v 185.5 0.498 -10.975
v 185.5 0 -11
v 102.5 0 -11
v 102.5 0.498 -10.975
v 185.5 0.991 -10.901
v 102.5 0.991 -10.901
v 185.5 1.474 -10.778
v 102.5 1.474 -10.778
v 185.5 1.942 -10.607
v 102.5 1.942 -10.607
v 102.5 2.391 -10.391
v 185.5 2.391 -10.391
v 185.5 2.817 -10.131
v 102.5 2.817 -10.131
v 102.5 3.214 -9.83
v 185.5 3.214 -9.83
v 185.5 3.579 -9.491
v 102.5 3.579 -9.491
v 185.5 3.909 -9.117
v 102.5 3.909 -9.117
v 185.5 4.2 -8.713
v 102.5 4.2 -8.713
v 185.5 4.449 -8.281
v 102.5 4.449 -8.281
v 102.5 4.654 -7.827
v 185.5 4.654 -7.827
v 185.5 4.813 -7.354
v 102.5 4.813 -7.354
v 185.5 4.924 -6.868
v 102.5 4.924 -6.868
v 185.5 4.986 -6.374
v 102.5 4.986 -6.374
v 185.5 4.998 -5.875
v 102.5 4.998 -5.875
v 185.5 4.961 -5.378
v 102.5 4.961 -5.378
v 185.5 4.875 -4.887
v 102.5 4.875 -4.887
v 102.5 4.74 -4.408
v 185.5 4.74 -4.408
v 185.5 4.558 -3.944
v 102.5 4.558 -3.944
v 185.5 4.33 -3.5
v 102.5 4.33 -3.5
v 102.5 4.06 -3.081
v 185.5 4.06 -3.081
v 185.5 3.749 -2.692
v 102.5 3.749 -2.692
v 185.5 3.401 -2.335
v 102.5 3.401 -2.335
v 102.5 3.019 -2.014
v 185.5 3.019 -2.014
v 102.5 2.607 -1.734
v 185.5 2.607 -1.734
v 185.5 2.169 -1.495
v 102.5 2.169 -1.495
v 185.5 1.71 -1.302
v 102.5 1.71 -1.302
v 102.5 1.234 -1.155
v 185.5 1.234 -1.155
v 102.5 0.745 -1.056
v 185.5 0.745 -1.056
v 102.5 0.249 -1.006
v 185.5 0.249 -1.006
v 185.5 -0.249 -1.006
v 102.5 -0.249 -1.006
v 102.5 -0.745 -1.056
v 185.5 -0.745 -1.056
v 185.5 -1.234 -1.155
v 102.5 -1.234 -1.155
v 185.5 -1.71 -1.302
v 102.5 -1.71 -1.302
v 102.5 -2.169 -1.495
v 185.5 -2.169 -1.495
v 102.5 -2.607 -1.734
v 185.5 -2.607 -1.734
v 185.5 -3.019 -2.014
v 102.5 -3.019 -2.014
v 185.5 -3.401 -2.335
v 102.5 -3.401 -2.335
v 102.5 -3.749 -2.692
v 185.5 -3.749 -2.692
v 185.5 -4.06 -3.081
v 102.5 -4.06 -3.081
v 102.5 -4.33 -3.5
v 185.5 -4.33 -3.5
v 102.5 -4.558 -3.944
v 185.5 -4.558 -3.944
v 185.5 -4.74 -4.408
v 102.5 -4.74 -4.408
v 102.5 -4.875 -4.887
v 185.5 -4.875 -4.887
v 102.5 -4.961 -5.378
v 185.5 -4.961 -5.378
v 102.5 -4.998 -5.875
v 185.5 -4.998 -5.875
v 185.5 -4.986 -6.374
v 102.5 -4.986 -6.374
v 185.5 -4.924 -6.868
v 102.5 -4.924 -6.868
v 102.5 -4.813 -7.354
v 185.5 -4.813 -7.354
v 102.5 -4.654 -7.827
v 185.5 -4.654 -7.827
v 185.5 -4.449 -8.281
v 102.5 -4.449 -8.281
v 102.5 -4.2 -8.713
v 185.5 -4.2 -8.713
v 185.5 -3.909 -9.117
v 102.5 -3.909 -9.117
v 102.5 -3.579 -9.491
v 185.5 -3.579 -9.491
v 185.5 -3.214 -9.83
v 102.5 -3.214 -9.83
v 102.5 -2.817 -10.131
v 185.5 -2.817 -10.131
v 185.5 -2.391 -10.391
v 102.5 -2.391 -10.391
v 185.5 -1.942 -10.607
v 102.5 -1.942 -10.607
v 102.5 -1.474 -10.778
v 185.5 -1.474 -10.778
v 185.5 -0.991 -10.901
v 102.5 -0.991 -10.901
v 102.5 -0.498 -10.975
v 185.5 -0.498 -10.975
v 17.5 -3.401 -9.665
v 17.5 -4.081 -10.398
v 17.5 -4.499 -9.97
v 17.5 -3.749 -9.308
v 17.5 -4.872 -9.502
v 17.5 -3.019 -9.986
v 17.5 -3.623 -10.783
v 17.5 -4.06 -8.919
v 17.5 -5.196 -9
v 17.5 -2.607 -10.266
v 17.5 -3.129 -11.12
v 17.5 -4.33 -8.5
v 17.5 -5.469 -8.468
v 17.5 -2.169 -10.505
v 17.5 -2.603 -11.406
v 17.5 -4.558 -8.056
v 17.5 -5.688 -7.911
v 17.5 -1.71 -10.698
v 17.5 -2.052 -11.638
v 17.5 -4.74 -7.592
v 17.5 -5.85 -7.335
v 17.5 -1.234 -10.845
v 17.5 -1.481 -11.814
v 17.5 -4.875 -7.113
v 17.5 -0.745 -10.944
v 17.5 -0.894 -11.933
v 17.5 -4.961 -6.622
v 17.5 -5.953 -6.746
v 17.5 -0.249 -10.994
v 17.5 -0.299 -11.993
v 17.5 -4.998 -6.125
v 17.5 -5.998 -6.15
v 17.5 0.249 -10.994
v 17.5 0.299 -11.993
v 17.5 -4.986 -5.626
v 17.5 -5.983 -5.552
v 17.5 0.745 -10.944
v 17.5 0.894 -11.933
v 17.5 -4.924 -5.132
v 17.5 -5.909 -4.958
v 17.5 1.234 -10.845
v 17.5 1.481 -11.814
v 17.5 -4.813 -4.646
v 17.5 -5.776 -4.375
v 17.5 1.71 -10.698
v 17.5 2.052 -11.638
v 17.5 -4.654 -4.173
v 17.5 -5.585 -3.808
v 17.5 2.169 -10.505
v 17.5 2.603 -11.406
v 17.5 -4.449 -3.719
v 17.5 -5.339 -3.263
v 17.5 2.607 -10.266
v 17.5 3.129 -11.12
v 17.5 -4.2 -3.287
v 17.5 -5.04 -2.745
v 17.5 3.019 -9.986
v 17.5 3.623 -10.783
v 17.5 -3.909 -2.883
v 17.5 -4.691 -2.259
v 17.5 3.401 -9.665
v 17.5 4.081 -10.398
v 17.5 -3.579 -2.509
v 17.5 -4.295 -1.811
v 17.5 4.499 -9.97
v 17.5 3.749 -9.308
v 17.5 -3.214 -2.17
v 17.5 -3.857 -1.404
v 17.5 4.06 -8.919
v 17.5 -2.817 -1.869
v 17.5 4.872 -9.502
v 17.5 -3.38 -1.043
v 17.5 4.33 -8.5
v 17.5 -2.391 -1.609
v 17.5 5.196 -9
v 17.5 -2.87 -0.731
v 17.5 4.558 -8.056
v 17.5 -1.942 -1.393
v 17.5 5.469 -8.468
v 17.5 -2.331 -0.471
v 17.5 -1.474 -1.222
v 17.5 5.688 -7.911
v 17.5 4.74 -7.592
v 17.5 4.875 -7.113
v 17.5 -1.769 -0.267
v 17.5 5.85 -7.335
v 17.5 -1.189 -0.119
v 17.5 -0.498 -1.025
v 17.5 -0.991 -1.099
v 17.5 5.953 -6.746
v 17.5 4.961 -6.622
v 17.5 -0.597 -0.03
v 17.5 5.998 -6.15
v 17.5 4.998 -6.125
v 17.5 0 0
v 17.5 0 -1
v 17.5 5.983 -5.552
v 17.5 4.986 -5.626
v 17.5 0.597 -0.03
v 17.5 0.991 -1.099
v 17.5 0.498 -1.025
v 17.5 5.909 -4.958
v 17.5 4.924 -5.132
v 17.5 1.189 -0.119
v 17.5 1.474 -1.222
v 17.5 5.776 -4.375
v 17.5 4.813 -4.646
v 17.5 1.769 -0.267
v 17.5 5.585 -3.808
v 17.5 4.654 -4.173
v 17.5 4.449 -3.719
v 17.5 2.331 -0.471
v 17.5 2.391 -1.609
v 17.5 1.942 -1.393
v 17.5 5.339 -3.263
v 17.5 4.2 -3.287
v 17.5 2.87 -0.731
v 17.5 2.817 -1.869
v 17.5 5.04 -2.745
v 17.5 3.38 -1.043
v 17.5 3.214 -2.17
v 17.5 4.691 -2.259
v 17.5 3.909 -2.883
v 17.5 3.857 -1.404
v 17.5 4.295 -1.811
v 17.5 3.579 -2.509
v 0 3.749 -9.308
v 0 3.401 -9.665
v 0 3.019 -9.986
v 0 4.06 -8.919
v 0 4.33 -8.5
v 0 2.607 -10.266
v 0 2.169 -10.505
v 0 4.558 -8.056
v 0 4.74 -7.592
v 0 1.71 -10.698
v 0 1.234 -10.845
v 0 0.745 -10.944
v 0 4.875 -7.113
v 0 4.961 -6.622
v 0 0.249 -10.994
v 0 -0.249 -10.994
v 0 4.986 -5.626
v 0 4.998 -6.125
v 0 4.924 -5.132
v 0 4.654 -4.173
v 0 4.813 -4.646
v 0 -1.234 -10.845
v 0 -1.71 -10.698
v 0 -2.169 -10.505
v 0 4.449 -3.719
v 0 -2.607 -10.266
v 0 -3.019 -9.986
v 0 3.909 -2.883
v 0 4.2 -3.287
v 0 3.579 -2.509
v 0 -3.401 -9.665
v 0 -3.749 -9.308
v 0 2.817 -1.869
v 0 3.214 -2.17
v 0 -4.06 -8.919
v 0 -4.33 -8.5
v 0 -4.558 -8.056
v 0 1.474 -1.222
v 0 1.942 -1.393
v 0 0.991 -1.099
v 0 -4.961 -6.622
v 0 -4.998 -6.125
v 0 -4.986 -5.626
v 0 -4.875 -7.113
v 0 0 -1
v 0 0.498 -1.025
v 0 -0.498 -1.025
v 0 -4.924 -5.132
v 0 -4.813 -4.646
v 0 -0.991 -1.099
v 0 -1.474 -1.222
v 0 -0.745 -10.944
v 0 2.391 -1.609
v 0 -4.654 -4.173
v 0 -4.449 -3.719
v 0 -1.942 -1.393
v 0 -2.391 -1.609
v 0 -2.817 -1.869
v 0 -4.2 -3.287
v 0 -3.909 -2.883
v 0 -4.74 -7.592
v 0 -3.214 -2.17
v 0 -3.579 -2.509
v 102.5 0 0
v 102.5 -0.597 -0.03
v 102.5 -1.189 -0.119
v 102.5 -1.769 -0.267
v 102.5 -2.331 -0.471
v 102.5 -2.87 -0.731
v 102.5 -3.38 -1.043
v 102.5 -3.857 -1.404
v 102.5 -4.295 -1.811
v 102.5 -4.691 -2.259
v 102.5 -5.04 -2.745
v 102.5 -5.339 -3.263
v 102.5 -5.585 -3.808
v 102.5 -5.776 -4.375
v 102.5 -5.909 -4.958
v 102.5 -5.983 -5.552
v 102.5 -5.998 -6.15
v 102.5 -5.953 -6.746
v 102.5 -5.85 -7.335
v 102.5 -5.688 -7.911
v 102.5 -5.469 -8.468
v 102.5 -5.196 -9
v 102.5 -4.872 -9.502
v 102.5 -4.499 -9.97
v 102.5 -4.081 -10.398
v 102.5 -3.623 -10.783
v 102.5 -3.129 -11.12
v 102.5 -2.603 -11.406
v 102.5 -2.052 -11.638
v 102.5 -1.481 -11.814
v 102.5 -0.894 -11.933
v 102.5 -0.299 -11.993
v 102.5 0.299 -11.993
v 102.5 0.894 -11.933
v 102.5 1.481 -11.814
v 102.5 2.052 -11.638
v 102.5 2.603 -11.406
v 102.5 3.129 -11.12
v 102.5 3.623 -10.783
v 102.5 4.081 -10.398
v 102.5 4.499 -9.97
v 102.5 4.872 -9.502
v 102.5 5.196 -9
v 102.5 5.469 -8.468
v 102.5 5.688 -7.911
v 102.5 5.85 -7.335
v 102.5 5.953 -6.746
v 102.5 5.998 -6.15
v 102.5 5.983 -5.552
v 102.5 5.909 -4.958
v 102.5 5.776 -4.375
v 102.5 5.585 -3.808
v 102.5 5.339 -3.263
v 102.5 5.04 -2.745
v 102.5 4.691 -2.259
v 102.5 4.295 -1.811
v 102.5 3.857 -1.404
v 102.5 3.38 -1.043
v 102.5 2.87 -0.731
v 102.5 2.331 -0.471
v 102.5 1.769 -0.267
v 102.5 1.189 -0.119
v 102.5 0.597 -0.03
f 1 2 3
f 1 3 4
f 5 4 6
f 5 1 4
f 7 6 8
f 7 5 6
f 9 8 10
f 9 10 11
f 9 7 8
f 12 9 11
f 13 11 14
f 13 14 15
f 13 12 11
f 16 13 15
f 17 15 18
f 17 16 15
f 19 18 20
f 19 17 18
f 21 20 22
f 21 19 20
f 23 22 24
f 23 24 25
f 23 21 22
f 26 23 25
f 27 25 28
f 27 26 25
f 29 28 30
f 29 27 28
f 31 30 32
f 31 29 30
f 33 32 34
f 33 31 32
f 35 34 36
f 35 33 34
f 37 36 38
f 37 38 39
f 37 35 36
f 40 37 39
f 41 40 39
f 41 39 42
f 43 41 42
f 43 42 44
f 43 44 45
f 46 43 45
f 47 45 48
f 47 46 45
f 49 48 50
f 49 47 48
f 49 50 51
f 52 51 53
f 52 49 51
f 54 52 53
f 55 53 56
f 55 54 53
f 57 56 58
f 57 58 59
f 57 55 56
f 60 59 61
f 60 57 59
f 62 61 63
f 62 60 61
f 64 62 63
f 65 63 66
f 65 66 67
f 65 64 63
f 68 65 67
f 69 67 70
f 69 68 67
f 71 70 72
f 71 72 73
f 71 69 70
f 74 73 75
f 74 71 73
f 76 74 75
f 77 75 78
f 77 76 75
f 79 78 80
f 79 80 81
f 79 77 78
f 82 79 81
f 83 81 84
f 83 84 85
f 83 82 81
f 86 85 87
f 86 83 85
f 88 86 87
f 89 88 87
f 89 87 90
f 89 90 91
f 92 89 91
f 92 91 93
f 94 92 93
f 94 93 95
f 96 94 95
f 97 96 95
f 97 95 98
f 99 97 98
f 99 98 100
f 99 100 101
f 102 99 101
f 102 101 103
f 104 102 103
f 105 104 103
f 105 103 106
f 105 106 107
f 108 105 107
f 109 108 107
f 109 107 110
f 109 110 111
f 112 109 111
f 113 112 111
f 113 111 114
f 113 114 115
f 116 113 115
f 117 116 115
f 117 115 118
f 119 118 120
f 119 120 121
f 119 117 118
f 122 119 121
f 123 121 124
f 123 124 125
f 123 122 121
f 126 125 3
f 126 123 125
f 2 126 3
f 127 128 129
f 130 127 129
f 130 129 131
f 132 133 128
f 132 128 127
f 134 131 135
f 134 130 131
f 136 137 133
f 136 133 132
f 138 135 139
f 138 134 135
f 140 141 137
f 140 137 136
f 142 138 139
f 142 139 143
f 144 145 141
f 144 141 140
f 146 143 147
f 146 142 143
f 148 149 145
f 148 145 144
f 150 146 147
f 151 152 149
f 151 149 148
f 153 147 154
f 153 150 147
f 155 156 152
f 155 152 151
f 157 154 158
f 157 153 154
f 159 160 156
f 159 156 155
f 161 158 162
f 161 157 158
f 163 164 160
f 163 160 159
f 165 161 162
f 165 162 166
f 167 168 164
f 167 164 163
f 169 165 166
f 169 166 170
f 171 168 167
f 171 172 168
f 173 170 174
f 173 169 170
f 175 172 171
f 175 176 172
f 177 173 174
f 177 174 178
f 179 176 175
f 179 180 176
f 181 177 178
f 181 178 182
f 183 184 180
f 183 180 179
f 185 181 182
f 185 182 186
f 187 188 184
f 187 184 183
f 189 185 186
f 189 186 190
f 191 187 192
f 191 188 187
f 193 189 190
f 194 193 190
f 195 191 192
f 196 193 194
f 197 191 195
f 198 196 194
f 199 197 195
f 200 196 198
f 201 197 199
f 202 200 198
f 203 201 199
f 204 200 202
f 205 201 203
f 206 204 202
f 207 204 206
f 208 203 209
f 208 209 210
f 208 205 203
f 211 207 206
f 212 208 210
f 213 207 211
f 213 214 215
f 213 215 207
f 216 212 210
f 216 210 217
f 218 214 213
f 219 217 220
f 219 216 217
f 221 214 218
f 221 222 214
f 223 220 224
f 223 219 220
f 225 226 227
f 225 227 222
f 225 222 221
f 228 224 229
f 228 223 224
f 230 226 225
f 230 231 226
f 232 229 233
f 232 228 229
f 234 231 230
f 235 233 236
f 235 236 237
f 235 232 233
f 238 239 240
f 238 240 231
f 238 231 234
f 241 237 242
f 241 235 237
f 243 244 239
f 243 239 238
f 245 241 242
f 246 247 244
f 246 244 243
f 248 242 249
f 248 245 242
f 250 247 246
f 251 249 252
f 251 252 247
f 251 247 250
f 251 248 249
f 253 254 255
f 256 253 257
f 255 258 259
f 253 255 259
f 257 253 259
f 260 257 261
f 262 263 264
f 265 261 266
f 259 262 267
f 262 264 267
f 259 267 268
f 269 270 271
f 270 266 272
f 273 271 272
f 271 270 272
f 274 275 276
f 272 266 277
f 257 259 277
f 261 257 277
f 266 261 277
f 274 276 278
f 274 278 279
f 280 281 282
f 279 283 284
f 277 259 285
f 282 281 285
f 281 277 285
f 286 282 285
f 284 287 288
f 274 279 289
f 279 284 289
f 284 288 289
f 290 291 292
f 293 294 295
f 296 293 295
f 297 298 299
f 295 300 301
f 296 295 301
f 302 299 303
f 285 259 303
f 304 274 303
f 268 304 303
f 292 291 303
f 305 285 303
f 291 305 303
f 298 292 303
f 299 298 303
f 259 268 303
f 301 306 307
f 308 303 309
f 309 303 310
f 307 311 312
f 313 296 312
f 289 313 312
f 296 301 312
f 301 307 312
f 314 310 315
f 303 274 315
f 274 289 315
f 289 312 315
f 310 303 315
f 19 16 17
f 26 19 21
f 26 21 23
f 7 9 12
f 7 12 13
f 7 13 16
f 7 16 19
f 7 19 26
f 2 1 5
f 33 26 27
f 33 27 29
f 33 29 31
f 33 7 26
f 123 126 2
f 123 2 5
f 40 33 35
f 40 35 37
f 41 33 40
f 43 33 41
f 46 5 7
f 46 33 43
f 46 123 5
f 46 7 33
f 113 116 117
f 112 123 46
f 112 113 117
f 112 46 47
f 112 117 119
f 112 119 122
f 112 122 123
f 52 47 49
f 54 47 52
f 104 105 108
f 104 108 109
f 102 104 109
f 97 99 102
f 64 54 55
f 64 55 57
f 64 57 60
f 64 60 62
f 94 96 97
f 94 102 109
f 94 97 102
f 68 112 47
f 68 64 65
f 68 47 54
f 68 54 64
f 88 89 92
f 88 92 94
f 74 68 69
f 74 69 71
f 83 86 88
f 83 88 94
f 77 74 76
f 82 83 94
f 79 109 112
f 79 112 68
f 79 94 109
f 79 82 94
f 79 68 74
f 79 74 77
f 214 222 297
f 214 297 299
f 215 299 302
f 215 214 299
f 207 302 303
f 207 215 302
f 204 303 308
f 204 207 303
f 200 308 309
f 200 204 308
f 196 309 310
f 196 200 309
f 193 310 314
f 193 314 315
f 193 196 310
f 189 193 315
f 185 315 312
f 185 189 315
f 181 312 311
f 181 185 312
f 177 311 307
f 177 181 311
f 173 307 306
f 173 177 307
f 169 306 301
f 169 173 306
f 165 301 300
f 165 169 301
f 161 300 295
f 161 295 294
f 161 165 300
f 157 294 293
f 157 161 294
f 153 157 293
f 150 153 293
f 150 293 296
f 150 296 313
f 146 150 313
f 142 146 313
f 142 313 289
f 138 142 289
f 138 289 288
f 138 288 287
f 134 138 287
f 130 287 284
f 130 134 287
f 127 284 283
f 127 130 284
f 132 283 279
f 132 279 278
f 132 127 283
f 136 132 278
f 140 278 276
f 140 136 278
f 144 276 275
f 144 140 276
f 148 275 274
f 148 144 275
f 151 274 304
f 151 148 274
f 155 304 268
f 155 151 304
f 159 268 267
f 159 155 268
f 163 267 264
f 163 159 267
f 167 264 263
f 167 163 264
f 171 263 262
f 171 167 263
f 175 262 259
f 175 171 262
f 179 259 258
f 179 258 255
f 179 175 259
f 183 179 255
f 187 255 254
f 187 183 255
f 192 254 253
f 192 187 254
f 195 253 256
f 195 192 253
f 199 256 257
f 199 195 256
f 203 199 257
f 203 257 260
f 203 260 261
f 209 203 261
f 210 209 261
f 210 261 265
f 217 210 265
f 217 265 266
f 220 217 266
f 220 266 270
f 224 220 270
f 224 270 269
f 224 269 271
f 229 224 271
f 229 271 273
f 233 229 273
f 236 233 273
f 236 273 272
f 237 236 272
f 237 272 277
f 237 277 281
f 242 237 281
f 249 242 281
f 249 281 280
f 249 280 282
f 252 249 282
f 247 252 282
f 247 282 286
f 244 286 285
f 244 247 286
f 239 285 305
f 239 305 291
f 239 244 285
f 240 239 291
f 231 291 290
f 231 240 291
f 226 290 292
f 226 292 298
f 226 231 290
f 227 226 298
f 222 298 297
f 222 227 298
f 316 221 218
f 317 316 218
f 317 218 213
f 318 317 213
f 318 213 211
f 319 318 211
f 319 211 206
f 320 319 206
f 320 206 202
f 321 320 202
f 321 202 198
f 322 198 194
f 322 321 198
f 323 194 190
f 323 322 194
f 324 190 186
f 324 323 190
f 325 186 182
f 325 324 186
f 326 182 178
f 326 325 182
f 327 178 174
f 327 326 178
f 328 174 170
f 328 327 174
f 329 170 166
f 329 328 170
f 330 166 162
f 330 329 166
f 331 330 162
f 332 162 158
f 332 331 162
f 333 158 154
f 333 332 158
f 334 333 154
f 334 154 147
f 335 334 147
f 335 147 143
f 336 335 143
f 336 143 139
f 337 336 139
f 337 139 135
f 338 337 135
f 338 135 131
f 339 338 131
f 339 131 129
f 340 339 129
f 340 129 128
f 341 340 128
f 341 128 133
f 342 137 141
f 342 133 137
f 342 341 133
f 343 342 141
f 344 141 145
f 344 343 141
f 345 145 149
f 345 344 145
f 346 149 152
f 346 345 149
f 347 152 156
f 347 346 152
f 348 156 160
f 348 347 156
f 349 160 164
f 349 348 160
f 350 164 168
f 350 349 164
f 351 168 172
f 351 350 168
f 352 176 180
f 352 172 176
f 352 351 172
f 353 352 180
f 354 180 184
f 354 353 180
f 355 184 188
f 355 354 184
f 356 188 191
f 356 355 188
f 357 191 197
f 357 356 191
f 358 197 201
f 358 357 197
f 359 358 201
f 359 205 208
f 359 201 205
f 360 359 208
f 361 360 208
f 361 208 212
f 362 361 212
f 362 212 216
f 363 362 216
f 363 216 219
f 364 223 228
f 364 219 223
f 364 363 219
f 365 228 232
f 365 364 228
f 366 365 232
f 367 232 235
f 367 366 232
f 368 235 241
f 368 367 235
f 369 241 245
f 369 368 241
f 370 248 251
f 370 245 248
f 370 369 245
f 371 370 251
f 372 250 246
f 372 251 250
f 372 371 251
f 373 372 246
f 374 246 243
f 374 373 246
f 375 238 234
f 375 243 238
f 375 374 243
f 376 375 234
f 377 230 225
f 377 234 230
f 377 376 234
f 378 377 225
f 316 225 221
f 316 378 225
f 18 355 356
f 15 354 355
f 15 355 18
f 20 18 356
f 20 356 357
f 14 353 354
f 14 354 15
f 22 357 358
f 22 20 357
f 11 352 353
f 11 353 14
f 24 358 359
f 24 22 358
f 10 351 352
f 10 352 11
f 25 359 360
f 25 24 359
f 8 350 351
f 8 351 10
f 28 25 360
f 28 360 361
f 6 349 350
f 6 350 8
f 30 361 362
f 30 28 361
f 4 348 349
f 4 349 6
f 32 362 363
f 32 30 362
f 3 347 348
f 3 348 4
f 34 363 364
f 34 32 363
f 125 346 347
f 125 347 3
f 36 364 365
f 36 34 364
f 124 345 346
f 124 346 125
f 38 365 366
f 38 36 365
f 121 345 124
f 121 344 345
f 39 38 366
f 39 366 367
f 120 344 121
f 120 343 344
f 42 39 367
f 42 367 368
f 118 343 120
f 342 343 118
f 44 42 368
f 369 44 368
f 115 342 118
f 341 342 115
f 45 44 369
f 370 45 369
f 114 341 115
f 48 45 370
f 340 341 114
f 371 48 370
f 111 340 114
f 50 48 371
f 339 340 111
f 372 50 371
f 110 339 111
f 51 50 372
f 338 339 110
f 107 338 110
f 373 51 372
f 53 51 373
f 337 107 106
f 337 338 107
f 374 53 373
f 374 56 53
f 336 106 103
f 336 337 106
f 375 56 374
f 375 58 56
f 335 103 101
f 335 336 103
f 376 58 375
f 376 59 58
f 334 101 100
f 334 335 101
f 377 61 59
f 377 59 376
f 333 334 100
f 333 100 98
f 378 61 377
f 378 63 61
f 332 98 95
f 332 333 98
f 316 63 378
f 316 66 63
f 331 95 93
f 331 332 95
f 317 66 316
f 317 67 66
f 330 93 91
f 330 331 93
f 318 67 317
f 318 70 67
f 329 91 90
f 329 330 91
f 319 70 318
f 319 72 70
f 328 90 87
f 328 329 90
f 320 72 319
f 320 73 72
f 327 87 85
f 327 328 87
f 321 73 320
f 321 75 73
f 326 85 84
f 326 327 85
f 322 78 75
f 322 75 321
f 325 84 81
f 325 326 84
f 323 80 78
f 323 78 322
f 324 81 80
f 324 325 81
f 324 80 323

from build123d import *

# Parameters (mm, degrees)
ESQUISSE2_W             = 185.5
ESQUISSE2_H             = 6
ESQUISSE3_R             = 6
ESQUISSE3_R_2           = 5
ENL_V_MAT_EXTRU_1_DEPTH = 83
ENL_V_START             = -17.5
ENL_V_MAT_EXTRU_2_DEPTH = 17.5


with BuildPart() as part:
    # Esquisse2 → Révolution2 (revolve)
    with BuildSketch(Plane(origin=(0, 0, 0), x_dir=(1, 0, 0), z_dir=(0, 1, 0))):
        with Locations((92.75, 3)):
            Rectangle(ESQUISSE2_W, ESQUISSE2_H)
    revolve(axis=Axis((0, 0, -6), (1, 0, 0)))

    # Esquisse3 → Enlèv. mat.-Extru.1 (cut)
    with BuildSketch(Plane(origin=(185.5, 0, 0), x_dir=(0, 0, -1), z_dir=(1, 0, 0))):
        with Locations(Location((6, 0, 0), (0, 0, 180))):
            Circle(ESQUISSE3_R)
        with Locations((6, 0)):
            Circle(ESQUISSE3_R_2, mode=Mode.SUBTRACT)
    extrude(amount=-ENL_V_MAT_EXTRU_1_DEPTH, mode=Mode.SUBTRACT)

    # Esquisse5 → Enlèv. mat.-Extru.2 (cut)
    with BuildSketch(Plane.ZY.offset(ENL_V_START)):
        with BuildLine():
            ThreePointArc((-11, 0), (-6, 5), (-1, 0))
            Line((-1, 0), (0, 0))
            ThreePointArc((0, 0), (-6, 6), (-12, 0))
            Line((-12, 0), (-11, 0))
        make_face()
        with BuildLine():
            Line((0, 0), (-1, 0))
            ThreePointArc((-1, 0), (-6, -5), (-11, 0))
            Line((-11, 0), (-12, 0))
            ThreePointArc((-12, 0), (-6, -6), (0, 0))
        make_face()
    extrude(amount=ENL_V_MAT_EXTRU_2_DEPTH, mode=Mode.SUBTRACT)


solid = part.part
